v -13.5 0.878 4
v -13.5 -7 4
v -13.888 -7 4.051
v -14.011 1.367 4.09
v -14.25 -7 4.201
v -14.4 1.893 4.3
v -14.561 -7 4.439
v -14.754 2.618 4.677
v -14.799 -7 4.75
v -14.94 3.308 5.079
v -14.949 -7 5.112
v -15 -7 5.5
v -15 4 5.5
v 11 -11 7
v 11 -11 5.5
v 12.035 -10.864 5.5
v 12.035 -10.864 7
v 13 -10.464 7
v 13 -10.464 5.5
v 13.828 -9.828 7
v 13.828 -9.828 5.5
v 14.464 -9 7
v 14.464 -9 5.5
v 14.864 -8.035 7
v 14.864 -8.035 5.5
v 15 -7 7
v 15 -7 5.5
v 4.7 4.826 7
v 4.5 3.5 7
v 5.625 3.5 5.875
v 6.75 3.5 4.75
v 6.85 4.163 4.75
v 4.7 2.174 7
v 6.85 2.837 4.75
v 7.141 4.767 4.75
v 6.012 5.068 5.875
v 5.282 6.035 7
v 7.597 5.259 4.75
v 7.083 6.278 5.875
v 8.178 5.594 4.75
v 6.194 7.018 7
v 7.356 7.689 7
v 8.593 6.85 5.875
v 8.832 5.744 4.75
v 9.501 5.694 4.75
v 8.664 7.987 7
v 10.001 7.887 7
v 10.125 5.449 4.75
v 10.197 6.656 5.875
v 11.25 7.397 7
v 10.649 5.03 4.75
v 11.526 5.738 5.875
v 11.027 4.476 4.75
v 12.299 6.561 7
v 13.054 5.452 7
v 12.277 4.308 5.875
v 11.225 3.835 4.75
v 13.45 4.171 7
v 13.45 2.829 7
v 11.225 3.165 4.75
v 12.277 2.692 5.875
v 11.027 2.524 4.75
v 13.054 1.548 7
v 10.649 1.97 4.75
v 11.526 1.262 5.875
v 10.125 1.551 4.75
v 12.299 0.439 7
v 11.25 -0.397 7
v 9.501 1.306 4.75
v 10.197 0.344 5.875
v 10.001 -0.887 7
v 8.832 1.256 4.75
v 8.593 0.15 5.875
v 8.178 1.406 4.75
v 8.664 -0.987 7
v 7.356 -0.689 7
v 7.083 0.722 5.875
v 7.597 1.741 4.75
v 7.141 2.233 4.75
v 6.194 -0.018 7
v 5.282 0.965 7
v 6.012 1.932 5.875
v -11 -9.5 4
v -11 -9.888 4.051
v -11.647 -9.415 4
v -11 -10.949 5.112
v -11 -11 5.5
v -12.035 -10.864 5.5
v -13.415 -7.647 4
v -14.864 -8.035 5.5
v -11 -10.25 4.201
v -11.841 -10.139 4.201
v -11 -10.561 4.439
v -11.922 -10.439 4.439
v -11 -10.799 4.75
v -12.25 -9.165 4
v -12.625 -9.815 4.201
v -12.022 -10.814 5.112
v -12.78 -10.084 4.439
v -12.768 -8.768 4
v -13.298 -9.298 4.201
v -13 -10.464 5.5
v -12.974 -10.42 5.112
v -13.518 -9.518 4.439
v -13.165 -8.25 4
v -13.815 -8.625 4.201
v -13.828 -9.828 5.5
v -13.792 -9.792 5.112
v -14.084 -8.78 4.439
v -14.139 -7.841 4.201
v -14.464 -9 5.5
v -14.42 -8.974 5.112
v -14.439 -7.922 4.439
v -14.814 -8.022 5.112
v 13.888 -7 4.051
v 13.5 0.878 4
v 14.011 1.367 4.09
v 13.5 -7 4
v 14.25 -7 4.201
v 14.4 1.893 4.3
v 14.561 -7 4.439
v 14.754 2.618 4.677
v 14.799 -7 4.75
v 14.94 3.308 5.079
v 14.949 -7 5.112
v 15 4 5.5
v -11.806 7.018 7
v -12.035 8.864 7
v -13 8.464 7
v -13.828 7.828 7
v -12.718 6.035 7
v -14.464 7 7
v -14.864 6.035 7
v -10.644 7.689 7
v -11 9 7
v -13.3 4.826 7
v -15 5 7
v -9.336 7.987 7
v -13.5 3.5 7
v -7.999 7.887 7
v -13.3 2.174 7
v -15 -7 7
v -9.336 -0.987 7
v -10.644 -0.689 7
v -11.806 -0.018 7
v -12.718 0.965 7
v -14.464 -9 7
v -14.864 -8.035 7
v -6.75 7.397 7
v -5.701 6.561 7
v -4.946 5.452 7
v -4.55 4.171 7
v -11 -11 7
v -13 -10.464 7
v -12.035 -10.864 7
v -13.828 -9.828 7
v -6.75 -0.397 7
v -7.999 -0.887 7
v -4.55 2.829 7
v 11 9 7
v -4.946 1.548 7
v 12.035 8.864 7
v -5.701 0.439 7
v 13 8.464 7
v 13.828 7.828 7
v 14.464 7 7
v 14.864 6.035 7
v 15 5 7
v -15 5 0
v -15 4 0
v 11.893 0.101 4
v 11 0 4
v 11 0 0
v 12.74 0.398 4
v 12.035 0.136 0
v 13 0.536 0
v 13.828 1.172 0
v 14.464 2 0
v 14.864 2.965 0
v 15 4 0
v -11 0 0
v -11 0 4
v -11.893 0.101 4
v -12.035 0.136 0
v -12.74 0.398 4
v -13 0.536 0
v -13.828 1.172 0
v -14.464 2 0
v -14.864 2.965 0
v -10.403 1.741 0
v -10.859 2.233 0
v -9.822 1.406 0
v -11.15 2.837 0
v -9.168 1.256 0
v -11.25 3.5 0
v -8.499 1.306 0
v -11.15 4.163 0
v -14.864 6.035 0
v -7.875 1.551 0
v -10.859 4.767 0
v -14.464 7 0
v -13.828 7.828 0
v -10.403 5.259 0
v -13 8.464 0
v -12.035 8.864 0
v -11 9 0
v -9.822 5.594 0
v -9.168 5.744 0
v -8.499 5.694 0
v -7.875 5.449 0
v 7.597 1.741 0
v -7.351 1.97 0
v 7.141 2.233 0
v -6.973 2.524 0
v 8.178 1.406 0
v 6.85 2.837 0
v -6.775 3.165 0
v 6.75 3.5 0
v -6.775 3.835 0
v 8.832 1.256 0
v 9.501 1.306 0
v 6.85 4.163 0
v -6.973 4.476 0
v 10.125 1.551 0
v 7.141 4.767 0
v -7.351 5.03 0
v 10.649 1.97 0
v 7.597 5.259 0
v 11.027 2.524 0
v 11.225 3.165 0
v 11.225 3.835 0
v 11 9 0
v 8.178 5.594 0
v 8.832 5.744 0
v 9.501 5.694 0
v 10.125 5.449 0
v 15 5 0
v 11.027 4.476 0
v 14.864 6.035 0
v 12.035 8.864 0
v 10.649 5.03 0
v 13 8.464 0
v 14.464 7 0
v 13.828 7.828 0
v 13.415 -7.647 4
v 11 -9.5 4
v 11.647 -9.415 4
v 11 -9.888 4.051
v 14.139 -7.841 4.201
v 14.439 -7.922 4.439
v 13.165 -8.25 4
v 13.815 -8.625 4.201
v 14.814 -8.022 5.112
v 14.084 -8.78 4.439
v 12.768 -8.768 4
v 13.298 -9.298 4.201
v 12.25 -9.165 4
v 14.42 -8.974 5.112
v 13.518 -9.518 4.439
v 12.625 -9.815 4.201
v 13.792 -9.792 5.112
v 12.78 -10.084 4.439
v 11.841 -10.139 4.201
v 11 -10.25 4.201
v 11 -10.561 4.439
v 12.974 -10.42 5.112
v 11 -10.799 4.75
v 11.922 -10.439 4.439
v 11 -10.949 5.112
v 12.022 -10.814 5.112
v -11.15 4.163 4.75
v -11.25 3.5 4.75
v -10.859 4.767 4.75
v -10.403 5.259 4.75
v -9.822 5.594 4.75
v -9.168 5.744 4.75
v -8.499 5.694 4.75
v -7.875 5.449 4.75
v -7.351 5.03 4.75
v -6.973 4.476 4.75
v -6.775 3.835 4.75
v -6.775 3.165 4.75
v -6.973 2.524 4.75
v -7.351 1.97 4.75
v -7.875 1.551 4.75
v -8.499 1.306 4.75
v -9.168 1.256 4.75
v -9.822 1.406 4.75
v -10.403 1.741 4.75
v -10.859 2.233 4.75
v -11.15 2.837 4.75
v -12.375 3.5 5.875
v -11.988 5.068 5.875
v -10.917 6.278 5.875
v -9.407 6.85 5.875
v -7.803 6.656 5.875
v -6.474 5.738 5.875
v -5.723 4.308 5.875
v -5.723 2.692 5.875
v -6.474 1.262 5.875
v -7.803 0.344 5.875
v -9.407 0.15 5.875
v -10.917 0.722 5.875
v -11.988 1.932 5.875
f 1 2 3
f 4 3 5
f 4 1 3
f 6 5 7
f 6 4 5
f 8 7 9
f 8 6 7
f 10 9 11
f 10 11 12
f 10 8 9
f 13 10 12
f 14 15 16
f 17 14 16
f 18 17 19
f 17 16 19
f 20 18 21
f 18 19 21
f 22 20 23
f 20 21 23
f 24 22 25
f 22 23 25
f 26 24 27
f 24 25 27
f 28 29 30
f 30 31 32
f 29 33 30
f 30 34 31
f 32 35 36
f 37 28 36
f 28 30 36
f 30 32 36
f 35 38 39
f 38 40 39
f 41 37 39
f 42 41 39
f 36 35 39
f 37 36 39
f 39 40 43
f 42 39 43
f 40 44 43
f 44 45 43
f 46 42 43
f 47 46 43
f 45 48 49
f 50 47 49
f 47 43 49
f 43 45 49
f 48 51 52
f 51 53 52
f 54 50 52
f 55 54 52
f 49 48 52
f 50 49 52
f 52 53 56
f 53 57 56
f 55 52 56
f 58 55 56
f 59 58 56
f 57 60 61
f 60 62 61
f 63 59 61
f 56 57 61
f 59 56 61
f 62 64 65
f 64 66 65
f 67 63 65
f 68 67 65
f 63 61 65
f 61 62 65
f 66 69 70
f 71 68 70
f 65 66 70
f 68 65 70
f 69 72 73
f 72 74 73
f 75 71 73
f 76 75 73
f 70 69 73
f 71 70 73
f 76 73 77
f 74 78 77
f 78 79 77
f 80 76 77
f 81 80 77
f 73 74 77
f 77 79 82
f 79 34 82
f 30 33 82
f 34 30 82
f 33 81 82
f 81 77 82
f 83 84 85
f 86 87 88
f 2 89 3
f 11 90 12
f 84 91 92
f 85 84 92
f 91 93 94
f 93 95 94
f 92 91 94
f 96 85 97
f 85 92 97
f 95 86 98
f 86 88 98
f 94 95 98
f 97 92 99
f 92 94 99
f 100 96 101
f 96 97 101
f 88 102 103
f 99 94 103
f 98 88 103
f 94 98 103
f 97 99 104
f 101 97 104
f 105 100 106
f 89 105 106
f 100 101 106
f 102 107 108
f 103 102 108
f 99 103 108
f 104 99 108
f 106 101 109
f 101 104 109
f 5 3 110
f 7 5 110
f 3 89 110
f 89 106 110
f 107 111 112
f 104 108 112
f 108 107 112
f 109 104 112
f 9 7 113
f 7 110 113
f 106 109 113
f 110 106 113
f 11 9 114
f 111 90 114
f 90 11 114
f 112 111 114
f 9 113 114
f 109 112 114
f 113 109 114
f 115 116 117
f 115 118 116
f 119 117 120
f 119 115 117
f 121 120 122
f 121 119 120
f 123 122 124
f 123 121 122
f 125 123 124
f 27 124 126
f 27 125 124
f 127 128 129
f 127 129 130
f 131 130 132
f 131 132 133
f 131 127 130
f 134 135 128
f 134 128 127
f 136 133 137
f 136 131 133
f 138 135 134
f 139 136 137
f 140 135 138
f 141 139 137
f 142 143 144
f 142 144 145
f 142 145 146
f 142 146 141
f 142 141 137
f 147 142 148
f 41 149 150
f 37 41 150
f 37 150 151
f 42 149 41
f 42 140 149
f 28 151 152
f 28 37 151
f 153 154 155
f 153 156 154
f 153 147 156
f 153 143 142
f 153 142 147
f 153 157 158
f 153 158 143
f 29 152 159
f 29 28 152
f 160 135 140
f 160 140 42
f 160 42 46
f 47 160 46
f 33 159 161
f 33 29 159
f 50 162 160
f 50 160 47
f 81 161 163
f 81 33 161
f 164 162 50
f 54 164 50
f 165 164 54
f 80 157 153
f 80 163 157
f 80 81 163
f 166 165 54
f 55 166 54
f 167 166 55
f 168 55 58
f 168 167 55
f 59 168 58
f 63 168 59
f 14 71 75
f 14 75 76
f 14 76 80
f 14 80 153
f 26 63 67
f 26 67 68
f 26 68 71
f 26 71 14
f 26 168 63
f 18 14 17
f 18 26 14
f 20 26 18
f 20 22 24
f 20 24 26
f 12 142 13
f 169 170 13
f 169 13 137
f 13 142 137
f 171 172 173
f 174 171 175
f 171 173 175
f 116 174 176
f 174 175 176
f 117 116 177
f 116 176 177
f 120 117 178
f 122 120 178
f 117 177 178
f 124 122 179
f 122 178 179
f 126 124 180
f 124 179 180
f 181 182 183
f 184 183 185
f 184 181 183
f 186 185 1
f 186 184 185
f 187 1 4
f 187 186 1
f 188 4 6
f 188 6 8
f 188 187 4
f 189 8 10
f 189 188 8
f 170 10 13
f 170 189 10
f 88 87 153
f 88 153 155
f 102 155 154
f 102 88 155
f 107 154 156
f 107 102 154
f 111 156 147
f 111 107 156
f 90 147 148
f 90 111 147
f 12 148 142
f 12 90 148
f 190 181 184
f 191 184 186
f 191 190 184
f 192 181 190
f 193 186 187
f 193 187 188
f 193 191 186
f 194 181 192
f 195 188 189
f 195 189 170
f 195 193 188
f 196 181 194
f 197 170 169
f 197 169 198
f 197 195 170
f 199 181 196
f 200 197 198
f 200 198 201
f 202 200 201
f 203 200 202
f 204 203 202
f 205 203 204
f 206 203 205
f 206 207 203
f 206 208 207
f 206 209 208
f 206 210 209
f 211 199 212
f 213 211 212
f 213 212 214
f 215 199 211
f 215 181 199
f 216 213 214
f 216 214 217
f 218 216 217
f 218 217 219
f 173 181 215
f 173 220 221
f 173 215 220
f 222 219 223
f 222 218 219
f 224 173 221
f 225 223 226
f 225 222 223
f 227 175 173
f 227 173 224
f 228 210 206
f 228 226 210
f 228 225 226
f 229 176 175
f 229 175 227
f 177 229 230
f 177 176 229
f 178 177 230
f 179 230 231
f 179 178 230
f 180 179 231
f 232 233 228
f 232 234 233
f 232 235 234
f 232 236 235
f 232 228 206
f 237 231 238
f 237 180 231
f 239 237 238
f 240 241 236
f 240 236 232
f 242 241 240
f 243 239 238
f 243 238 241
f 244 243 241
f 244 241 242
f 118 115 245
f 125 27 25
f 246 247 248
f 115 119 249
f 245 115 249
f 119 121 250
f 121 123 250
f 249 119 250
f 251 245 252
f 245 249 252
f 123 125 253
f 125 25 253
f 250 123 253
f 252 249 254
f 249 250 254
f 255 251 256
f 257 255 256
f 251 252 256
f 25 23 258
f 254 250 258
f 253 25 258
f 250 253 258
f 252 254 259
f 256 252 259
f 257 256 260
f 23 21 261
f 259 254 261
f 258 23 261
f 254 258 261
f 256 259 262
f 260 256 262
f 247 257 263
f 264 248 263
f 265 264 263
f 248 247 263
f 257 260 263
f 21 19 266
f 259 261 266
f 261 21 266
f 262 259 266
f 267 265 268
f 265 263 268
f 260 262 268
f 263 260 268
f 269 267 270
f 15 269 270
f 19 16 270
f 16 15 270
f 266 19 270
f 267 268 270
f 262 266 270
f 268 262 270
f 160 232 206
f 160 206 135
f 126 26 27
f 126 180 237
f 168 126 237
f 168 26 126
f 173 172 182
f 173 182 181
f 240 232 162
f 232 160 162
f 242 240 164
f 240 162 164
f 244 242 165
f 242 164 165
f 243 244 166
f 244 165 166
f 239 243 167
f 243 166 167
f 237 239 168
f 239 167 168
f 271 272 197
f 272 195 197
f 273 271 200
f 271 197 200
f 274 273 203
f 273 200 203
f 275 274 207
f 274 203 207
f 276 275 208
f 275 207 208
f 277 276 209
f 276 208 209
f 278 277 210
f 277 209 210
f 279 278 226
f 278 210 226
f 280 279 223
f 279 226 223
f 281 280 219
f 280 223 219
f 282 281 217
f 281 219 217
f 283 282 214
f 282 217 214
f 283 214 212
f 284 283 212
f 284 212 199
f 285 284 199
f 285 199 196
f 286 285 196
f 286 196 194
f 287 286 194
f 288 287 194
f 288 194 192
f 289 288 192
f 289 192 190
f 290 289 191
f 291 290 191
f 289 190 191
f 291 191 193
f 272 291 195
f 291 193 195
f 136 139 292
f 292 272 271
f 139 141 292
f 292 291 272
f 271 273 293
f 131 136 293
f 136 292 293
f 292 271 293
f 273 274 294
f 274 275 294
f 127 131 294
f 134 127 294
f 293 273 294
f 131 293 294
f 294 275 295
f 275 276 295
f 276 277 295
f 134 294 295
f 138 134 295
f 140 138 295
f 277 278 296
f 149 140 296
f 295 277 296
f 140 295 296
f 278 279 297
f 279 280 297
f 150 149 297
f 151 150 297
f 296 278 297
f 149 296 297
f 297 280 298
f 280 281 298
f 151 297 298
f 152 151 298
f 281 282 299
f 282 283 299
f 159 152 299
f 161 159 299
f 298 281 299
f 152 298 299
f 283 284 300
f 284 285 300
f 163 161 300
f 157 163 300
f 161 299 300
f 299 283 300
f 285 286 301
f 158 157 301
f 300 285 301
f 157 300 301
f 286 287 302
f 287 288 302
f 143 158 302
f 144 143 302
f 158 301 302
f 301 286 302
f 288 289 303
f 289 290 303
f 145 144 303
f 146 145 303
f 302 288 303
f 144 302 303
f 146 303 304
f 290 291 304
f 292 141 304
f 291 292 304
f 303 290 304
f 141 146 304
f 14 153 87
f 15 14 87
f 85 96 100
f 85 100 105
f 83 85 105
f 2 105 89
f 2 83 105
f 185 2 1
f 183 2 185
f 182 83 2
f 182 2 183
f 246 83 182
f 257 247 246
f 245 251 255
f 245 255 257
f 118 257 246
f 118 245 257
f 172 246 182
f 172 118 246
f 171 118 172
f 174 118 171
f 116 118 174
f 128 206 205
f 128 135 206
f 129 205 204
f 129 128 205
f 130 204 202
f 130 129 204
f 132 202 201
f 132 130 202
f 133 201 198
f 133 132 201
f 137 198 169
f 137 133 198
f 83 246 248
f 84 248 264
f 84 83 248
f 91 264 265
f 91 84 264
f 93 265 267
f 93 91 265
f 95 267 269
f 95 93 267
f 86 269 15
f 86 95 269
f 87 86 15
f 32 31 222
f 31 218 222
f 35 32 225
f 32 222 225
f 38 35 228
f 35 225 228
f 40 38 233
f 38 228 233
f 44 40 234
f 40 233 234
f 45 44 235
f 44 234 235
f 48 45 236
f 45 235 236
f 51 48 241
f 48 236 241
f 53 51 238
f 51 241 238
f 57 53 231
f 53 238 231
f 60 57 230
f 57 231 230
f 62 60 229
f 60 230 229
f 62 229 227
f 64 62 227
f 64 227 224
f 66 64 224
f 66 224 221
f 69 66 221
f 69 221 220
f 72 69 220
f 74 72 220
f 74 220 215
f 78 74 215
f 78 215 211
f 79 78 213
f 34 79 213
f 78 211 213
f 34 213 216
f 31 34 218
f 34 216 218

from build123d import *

# Parameters (mm, degrees)
F1_DEPTH       = 15
F3_D           = 4.5
F3_CSINK_D     = 9
F3_CSINK_ANGLE = 90
F4_R           = 4
F5_R           = 1.5


with BuildPart() as f1:
    # F0 (on Right) → F1 (new body, symmetric)
    with BuildSketch(Plane.YZ):
        Polygon((0, 4), (0, 0), (9, 0), (9, 7), (-11, 7), (-11, 4), align=None)
    extrude(amount=F1_DEPTH, both=True)

    # F3 (through all)
    with Locations(Plane.XY.offset(7)):
        with Locations((-9, 3.5), (9, 3.5)):
            CounterSinkHole(F3_D / 2, F3_CSINK_D / 2, counter_sink_angle=F3_CSINK_ANGLE)

    # F4
    f4_edges = [f1.edges().sort_by_distance(p)[0] for p in [
        (15, -11, 5.5),
        (-15, -11, 5.5),
        (15, 0, 2),
        (-15, 0, 2),
        (-15, 9, 3.5),
        (15, 9, 3.5),
    ]]
    fillet(f4_edges, radius=F4_R)

    # F5
    f5_edges = [f1.edges().sort_by_distance(p)[0] for p in [
        (-15, -3.5, 4),
    ]]
    fillet(f5_edges, radius=F5_R)


solid = f1.part
